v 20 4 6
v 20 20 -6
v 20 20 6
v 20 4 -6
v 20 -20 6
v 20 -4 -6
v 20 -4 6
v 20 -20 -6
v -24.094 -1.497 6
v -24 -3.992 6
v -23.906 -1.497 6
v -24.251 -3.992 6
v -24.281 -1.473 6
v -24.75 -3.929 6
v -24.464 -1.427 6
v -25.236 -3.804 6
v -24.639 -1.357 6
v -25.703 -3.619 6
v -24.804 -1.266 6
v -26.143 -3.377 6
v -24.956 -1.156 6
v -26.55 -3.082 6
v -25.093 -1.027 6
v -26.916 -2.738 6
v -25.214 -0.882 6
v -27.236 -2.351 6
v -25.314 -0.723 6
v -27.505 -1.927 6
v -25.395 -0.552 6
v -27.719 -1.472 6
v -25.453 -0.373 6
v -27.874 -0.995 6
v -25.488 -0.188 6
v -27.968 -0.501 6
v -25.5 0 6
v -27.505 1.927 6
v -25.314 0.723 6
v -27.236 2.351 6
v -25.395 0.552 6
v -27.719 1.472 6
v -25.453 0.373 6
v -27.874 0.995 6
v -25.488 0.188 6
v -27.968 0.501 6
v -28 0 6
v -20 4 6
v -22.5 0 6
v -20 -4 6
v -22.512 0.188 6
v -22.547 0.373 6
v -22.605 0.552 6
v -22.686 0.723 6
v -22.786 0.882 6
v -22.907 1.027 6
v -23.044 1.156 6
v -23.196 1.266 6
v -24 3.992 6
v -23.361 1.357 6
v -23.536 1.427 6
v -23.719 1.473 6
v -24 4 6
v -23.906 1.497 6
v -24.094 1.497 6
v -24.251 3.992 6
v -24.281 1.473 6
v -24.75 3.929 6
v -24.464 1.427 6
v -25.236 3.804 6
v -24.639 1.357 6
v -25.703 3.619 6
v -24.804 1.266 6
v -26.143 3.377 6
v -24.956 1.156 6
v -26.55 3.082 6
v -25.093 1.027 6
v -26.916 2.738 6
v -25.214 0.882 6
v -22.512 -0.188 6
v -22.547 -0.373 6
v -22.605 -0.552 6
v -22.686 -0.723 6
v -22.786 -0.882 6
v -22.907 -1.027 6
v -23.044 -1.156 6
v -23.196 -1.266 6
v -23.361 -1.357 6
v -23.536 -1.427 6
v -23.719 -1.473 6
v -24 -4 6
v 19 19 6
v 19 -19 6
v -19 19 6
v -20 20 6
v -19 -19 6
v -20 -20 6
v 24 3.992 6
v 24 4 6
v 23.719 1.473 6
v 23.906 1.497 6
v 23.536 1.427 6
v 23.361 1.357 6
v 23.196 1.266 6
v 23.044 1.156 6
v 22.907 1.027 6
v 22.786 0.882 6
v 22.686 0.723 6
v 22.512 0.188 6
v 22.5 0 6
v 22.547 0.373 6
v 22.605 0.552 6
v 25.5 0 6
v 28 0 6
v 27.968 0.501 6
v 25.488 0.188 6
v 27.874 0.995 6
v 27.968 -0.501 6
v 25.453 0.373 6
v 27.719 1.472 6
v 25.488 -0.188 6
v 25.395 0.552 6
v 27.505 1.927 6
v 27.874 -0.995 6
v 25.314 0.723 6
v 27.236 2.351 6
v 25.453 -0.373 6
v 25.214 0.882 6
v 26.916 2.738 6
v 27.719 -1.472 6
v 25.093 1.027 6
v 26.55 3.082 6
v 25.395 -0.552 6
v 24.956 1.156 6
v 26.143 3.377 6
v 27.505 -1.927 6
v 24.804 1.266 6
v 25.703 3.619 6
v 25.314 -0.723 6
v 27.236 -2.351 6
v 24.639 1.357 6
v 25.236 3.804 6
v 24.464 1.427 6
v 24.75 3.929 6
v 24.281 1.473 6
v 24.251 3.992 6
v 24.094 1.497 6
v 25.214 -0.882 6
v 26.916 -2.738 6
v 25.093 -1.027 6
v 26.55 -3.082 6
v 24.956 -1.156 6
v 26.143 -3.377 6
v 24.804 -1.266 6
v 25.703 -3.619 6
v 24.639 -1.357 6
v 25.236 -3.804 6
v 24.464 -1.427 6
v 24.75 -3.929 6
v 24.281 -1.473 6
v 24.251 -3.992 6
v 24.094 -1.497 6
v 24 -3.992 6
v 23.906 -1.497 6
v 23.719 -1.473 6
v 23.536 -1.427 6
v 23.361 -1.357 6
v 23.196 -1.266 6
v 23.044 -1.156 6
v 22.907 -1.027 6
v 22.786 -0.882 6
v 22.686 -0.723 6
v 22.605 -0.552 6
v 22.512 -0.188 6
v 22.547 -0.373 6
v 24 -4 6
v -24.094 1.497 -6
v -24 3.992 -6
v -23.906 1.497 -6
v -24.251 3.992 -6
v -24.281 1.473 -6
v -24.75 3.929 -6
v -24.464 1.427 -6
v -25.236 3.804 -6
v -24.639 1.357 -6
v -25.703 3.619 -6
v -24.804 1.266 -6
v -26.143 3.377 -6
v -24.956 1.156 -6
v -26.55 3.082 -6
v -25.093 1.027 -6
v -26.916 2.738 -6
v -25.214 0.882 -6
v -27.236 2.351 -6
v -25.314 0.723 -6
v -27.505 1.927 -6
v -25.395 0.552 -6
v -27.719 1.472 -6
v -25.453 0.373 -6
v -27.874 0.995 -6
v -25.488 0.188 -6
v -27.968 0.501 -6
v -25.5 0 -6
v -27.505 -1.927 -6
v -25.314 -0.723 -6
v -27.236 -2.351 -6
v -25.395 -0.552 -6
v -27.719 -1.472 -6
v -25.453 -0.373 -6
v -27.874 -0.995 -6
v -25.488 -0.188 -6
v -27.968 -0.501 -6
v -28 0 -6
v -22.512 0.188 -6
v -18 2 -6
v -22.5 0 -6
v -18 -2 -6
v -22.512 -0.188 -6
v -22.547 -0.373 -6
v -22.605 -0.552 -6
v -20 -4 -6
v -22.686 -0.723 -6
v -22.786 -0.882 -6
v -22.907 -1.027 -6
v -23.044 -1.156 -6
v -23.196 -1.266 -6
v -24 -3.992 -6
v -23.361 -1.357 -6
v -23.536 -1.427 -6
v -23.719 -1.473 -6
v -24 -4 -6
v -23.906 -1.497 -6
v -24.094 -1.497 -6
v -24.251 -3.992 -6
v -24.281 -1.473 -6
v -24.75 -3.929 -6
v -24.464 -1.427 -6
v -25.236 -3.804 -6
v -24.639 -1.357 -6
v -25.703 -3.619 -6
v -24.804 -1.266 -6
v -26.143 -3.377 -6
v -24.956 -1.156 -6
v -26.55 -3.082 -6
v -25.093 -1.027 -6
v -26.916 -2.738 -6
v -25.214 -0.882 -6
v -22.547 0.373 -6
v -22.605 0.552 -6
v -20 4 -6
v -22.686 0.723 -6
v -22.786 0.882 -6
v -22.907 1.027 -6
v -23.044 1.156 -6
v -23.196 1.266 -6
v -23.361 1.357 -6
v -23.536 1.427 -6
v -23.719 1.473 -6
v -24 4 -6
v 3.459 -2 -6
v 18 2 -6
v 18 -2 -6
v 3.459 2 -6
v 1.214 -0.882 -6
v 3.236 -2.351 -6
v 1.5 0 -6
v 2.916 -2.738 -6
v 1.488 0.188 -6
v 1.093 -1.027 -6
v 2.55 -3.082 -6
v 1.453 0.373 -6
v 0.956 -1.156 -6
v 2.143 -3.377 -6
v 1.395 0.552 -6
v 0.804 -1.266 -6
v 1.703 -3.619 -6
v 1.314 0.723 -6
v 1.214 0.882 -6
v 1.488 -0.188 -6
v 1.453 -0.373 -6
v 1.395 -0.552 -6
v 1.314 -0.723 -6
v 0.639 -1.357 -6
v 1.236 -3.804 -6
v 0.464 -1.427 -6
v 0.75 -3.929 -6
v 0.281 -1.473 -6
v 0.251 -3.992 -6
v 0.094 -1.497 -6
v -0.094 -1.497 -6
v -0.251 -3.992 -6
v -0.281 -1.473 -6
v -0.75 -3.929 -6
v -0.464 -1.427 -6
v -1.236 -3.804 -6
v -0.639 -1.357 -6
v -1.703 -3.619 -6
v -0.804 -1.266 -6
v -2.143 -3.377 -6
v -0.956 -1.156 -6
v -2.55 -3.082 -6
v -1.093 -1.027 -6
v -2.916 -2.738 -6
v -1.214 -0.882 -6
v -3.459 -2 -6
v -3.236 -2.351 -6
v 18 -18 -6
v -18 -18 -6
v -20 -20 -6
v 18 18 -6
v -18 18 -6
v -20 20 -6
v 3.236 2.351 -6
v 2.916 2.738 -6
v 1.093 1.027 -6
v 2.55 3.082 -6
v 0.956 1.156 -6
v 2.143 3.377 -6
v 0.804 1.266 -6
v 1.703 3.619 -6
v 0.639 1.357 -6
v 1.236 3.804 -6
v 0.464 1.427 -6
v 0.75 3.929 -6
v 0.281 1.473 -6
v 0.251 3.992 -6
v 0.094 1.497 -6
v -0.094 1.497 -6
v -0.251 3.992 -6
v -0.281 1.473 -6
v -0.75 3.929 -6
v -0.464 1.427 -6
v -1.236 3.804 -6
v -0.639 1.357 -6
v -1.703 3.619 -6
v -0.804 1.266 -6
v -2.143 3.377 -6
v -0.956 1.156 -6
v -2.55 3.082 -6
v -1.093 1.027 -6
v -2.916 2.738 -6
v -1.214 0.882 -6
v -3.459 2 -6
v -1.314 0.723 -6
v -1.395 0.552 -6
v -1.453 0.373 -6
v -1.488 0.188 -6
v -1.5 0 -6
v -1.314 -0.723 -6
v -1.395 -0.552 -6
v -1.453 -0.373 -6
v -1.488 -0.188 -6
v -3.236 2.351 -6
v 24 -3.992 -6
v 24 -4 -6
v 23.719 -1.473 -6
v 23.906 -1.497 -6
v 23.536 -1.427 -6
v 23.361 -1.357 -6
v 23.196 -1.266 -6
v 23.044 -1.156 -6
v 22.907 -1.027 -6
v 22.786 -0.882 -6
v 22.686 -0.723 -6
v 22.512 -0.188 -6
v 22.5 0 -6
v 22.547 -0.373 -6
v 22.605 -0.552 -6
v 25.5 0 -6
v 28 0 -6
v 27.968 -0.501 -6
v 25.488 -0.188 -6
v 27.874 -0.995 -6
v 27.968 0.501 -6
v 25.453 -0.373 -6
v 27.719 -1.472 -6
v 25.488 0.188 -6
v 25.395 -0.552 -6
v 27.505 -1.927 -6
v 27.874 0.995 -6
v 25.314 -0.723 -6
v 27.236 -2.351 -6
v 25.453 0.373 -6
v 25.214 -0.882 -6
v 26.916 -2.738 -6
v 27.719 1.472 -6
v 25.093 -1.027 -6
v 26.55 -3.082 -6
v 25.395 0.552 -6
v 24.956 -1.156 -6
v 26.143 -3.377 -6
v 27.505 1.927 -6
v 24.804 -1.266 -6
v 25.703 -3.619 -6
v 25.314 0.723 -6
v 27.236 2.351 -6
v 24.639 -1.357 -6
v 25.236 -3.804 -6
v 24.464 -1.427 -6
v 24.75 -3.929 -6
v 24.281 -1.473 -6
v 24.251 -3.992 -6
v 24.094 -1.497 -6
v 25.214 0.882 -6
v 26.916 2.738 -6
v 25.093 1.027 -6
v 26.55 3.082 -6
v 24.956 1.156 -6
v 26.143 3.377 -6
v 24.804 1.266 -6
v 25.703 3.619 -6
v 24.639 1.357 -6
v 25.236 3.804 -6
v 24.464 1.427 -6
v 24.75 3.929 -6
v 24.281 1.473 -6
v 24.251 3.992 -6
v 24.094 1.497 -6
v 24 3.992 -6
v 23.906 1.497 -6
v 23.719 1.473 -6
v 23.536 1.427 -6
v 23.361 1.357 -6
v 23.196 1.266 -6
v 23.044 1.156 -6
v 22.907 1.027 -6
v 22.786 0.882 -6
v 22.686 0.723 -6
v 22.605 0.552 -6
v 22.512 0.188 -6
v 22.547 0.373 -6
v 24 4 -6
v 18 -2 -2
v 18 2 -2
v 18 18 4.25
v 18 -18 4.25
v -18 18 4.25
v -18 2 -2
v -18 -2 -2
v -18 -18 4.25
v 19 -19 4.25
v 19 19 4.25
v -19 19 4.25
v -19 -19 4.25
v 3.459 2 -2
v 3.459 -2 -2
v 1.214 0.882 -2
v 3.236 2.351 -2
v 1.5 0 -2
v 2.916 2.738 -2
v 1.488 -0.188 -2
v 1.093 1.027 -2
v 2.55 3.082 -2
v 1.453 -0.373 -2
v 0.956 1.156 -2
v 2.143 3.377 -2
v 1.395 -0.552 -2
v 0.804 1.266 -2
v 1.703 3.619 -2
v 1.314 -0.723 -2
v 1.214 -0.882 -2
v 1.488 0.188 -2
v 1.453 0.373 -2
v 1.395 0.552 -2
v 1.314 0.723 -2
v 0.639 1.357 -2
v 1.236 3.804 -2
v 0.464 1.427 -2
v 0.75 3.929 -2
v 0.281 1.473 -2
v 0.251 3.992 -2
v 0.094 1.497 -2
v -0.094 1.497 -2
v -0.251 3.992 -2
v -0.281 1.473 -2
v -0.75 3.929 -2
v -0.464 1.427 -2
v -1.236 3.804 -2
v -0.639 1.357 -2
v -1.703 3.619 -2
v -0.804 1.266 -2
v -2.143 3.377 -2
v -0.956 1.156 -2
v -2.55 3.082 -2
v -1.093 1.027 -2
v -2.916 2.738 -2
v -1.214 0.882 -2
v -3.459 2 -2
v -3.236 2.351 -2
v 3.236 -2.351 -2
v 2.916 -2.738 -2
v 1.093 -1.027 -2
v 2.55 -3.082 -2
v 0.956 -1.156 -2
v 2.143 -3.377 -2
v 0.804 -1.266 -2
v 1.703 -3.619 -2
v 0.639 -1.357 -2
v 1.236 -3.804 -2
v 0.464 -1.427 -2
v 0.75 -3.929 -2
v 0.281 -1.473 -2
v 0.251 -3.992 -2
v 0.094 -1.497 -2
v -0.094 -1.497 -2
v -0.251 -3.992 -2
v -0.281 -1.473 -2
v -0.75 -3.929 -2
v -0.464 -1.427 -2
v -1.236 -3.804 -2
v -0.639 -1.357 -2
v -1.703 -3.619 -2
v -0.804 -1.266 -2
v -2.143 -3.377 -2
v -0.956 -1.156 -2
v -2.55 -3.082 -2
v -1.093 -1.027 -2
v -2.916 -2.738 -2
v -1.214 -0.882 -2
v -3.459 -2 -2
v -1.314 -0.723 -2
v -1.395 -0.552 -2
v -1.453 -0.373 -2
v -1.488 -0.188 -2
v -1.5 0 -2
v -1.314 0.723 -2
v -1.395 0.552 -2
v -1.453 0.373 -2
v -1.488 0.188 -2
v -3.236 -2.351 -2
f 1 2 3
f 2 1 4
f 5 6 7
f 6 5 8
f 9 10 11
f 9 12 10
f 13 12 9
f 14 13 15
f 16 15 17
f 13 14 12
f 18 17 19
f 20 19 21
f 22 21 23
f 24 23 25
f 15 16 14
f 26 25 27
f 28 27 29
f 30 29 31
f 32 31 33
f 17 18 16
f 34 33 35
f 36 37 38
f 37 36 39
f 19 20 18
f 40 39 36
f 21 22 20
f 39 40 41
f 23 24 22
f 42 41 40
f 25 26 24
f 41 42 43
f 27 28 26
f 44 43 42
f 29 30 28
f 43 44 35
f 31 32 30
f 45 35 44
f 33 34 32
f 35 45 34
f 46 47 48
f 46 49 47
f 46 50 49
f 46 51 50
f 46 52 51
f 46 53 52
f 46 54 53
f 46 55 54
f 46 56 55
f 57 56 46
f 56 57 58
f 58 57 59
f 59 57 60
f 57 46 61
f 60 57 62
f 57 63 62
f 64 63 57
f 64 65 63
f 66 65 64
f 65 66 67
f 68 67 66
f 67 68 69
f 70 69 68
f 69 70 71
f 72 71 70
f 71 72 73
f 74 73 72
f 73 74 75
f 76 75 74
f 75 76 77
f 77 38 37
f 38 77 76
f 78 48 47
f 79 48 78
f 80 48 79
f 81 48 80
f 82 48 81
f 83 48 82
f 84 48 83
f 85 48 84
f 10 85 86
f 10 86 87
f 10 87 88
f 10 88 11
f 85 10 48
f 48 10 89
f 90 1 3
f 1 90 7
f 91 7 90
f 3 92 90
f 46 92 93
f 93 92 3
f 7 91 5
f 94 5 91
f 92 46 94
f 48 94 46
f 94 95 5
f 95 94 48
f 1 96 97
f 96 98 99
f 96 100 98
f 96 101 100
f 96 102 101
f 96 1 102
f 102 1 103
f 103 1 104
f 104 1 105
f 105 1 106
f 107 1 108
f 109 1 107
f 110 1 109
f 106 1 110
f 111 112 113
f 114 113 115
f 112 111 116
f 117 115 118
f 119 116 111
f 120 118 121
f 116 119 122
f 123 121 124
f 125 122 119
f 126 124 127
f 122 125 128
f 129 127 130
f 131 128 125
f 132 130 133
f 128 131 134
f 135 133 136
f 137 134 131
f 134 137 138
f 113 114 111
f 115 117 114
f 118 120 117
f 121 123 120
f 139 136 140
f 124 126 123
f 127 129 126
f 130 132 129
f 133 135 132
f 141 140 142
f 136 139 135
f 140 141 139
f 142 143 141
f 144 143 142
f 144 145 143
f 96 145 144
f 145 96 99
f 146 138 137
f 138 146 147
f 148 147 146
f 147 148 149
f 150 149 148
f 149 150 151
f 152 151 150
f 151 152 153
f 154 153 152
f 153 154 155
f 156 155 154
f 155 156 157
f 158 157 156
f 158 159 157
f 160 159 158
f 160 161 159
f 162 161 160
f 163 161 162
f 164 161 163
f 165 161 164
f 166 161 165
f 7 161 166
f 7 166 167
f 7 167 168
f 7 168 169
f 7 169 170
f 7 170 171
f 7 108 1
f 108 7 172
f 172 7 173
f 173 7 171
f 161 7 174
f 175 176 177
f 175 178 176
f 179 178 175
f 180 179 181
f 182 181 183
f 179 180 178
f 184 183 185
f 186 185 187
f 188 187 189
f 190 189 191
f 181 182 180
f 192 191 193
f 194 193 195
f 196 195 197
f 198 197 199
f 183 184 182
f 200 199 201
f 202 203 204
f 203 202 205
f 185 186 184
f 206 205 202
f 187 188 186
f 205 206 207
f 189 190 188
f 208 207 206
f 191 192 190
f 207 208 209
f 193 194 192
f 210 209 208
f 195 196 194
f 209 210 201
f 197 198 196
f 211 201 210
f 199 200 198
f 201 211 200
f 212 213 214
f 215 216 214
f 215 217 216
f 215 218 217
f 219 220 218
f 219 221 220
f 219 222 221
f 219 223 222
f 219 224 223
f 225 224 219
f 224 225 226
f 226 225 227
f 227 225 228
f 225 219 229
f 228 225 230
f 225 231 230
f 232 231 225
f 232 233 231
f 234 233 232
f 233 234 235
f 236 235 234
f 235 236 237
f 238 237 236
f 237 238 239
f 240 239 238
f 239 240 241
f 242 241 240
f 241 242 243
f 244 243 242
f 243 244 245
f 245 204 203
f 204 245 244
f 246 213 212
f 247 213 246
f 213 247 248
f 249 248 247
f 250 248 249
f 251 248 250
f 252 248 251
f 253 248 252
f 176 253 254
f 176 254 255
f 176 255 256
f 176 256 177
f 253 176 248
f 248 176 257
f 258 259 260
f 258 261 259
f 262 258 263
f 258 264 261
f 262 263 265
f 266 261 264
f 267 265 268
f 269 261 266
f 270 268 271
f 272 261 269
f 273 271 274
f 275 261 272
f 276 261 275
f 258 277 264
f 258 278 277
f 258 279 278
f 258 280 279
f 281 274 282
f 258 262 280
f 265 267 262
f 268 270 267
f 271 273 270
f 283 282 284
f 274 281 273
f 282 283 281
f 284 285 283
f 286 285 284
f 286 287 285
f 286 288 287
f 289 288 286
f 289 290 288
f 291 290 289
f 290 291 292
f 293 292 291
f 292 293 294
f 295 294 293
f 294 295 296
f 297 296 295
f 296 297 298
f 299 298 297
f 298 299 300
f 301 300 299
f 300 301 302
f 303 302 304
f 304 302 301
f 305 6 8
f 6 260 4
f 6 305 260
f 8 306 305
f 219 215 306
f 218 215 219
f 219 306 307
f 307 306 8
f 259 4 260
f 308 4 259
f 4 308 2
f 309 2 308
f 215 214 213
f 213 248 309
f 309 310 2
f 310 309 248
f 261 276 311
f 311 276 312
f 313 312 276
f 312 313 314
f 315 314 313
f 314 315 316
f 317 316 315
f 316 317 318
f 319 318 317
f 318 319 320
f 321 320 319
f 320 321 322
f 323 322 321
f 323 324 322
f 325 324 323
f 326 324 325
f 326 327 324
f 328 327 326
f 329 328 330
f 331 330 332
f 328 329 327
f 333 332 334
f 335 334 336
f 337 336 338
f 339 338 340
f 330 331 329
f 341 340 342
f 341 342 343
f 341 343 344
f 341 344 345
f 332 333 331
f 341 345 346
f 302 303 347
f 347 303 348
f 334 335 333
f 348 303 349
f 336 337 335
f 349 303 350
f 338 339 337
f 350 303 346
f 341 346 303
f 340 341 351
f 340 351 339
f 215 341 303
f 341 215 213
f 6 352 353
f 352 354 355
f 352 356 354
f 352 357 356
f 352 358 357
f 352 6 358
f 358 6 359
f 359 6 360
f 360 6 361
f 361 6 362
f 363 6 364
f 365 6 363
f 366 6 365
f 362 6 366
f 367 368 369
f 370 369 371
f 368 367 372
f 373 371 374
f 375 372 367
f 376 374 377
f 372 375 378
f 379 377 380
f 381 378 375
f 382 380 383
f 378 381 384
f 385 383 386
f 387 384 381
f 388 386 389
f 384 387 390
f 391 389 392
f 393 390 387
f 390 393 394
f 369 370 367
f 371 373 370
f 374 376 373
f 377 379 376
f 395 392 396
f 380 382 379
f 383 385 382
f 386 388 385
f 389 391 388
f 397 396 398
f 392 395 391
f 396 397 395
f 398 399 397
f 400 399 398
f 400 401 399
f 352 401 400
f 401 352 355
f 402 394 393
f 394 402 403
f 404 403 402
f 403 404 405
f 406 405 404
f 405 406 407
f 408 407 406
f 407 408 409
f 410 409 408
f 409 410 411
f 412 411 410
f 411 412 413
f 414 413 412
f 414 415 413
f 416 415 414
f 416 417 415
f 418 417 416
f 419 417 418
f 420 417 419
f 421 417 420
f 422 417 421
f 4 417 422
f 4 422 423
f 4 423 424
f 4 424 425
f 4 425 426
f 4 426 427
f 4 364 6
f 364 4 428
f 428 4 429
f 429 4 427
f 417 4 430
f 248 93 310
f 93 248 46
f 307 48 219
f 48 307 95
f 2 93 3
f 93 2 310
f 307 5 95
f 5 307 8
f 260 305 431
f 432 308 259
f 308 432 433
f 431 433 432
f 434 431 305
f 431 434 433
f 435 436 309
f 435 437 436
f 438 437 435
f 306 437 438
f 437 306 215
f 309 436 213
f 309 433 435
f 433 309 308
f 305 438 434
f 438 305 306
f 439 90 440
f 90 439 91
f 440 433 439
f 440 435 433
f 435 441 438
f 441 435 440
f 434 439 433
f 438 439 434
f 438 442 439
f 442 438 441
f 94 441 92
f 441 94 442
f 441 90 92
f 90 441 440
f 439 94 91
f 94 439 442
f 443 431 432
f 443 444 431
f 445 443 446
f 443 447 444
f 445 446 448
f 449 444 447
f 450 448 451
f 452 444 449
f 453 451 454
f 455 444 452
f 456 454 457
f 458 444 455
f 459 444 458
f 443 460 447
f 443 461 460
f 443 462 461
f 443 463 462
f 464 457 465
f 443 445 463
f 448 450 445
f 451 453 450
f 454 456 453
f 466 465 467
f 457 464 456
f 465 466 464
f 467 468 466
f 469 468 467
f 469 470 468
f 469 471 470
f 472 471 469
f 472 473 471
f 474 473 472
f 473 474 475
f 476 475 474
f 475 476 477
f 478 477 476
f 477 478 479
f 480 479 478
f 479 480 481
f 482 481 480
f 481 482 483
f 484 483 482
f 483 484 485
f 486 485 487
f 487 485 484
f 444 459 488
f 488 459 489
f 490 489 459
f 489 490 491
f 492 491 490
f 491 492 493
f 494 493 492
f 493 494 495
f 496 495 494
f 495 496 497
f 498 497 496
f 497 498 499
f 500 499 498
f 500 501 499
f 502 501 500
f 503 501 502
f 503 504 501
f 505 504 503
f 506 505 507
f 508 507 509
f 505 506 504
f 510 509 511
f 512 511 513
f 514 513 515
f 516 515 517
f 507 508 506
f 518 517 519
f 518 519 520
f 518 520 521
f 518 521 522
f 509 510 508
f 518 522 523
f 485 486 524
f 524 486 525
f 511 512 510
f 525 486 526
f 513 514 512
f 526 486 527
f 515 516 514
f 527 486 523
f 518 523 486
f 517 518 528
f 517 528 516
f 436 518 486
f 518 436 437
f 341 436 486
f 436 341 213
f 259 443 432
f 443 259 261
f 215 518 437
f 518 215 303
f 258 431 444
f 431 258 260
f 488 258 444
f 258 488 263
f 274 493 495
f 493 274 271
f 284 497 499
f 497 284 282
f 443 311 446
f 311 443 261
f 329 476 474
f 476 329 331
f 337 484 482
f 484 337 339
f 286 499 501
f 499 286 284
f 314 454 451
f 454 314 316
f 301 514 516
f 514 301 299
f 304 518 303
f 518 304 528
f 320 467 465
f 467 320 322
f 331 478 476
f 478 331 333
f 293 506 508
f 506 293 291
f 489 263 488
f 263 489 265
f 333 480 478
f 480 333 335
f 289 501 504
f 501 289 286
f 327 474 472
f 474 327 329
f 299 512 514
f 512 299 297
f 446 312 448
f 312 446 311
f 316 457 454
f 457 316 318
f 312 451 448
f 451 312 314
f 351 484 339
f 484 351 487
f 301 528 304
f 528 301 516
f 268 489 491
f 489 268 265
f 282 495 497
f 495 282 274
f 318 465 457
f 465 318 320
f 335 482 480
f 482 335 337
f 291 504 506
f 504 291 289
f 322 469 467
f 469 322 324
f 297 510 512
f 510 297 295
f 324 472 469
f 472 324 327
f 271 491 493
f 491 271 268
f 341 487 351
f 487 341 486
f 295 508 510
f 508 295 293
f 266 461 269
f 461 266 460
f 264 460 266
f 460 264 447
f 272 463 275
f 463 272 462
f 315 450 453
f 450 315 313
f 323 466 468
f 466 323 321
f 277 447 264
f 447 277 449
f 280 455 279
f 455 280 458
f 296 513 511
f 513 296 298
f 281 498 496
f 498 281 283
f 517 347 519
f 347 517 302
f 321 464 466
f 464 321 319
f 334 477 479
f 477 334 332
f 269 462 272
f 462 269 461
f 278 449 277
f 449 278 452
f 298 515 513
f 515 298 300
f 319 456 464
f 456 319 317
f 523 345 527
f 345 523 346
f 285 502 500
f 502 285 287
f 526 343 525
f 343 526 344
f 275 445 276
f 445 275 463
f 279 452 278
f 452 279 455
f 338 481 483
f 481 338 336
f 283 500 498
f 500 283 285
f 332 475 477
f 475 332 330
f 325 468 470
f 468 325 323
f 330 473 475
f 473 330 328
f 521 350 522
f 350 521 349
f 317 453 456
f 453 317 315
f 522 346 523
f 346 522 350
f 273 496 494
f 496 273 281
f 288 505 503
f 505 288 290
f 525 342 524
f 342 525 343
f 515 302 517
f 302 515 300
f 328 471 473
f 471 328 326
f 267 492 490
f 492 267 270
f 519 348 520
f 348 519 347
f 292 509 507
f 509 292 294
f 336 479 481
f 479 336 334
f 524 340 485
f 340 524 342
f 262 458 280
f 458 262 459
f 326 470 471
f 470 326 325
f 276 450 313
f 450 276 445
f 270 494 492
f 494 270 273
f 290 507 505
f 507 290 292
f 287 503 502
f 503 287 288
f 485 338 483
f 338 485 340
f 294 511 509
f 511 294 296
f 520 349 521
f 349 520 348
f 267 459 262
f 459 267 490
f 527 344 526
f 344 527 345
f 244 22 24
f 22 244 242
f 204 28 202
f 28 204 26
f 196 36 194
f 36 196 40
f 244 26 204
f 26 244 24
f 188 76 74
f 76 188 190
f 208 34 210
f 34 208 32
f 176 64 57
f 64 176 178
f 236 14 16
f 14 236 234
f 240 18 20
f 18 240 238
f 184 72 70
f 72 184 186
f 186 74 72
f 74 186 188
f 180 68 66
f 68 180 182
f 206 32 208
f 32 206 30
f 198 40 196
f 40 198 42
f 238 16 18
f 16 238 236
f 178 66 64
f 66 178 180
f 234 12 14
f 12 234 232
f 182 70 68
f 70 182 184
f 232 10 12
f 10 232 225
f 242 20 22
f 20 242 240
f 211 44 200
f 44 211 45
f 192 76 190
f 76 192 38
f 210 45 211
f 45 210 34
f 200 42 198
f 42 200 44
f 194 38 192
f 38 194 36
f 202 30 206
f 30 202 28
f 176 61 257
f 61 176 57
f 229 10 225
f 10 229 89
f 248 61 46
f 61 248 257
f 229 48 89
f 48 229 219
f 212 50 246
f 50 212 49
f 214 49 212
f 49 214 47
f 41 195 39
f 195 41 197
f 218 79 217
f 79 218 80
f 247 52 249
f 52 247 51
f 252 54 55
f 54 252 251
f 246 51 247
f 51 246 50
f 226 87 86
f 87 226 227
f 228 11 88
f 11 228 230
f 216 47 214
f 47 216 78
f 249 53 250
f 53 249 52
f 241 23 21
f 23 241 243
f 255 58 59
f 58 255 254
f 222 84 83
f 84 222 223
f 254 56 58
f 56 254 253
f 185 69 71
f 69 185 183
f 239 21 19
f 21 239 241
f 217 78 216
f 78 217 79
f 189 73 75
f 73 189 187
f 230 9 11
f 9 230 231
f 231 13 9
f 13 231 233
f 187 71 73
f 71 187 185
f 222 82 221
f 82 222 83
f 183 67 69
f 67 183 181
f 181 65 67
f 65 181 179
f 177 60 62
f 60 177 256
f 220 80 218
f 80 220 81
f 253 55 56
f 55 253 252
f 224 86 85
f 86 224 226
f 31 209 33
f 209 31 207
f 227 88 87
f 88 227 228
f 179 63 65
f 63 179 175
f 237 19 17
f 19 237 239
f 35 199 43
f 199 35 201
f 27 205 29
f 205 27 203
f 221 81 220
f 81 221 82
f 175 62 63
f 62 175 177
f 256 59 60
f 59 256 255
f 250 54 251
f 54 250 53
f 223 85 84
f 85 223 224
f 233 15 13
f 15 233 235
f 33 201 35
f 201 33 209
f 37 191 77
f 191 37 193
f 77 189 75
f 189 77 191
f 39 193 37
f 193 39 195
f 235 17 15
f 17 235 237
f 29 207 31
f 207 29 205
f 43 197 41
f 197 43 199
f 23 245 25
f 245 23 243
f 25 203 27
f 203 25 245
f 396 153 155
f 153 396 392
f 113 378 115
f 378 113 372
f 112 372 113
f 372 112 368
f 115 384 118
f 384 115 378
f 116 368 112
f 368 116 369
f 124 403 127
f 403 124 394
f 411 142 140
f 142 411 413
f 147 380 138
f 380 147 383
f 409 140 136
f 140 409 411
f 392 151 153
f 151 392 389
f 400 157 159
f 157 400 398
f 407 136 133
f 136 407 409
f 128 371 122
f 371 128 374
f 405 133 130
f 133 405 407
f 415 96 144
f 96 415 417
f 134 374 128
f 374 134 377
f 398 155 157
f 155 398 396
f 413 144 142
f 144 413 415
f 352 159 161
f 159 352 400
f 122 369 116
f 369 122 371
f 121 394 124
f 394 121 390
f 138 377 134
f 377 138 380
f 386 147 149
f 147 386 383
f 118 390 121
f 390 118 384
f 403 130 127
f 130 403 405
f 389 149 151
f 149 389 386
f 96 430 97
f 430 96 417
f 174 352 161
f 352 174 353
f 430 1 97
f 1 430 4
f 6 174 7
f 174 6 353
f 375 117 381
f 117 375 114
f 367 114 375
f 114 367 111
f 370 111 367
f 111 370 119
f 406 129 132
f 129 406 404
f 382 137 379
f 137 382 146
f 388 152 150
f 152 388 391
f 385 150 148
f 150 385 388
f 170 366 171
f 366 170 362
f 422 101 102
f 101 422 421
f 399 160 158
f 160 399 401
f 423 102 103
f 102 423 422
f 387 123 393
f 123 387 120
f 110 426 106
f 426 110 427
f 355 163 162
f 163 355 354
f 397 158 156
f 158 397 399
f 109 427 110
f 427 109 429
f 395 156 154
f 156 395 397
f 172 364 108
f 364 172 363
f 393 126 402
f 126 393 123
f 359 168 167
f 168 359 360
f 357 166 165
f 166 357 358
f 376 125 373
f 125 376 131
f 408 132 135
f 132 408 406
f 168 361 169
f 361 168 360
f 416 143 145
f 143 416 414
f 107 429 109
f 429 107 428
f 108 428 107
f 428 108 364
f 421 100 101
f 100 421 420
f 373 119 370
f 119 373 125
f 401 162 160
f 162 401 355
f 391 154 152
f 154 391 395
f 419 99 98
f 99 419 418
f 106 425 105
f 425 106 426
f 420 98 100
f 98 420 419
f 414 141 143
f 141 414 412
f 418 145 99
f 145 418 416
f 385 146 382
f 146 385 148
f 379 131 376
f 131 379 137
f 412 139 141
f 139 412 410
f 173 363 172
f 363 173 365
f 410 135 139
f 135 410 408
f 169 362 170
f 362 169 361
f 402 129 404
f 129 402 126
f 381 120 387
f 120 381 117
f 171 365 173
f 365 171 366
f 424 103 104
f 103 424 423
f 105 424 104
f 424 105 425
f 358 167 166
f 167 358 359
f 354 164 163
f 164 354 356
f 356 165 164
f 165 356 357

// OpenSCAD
//
// backplate of ArduCam IMX291
//

camera_square = 38.00;
lip_width = 2;
depth = 12;

circuit_board_thickness = 1.75;

globe_major = 8;
globe_pilot = 3;
globe_bar_thickness = 4;

globe_bar_width = 4;

$fn = 50;

union() {
    difference() {
        {
        // major square
        cube([camera_square + lip_width, 
            camera_square + lip_width, 
            depth], center=true);
        }
        // subtract the center
        {
        // remove the center
        cube([camera_square - lip_width, 
            camera_square - lip_width, 
            depth], center=true);
        // board mounting lip
        translate([0,0, (depth/2 - circuit_board_thickness/2)])
            cube([camera_square,
                camera_square,
                circuit_board_thickness], center=true);
        }
    }
    
    // add globe mount 
    difference() {
        {
        // globe_bar
        union() {
            translate([0,0,-(depth/2 - globe_bar_width/2)])
            cube([camera_square + 2,
                globe_bar_width,
                globe_bar_thickness], center=true);    
            // screw mount
            translate([0,0,-(depth/2 - globe_bar_width/2)])
            cylinder(r = globe_major/2, h = globe_bar_thickness, center = true);
            }
        }
        // subtract mounting holes
        {
        translate([0,0,-(depth/2 - globe_bar_width/2)])
        cylinder(r = globe_pilot/2, h = globe_bar_thickness, center = true); 
        }
        
    } // end of globe mount
    
    // add side mounts
    // left side
    difference () {
        union () {
        translate([-((camera_square+2)/2 + globe_major/2),0,0])
        cylinder(r = globe_major/2, h = depth, center = true);
        
        translate([-((camera_square+2)/2 + globe_major/4),0,0])
        cube([globe_major/2, globe_major, depth], center = true);
        }
        // screw hole
        {
        translate([-((camera_square+2)/2 + globe_major/2),0,0])
        cylinder(r = globe_pilot/2, h = depth, center = true);
        }
    }
    // right side
    difference () {
        union () {
        translate([((camera_square+2)/2 + globe_major/2),0,0])
        cylinder(r = globe_major/2, h = depth, center = true);
        
        translate([((camera_square+2)/2 + globe_major/4),0,0])
        cube([globe_major/2, globe_major, depth], center = true);
        }
        // screw hole
        {
        translate([((camera_square+2)/2 + globe_major/2),0,0])
        cylinder(r = globe_pilot/2, h = depth, center = true);
        }
    }
} // union
